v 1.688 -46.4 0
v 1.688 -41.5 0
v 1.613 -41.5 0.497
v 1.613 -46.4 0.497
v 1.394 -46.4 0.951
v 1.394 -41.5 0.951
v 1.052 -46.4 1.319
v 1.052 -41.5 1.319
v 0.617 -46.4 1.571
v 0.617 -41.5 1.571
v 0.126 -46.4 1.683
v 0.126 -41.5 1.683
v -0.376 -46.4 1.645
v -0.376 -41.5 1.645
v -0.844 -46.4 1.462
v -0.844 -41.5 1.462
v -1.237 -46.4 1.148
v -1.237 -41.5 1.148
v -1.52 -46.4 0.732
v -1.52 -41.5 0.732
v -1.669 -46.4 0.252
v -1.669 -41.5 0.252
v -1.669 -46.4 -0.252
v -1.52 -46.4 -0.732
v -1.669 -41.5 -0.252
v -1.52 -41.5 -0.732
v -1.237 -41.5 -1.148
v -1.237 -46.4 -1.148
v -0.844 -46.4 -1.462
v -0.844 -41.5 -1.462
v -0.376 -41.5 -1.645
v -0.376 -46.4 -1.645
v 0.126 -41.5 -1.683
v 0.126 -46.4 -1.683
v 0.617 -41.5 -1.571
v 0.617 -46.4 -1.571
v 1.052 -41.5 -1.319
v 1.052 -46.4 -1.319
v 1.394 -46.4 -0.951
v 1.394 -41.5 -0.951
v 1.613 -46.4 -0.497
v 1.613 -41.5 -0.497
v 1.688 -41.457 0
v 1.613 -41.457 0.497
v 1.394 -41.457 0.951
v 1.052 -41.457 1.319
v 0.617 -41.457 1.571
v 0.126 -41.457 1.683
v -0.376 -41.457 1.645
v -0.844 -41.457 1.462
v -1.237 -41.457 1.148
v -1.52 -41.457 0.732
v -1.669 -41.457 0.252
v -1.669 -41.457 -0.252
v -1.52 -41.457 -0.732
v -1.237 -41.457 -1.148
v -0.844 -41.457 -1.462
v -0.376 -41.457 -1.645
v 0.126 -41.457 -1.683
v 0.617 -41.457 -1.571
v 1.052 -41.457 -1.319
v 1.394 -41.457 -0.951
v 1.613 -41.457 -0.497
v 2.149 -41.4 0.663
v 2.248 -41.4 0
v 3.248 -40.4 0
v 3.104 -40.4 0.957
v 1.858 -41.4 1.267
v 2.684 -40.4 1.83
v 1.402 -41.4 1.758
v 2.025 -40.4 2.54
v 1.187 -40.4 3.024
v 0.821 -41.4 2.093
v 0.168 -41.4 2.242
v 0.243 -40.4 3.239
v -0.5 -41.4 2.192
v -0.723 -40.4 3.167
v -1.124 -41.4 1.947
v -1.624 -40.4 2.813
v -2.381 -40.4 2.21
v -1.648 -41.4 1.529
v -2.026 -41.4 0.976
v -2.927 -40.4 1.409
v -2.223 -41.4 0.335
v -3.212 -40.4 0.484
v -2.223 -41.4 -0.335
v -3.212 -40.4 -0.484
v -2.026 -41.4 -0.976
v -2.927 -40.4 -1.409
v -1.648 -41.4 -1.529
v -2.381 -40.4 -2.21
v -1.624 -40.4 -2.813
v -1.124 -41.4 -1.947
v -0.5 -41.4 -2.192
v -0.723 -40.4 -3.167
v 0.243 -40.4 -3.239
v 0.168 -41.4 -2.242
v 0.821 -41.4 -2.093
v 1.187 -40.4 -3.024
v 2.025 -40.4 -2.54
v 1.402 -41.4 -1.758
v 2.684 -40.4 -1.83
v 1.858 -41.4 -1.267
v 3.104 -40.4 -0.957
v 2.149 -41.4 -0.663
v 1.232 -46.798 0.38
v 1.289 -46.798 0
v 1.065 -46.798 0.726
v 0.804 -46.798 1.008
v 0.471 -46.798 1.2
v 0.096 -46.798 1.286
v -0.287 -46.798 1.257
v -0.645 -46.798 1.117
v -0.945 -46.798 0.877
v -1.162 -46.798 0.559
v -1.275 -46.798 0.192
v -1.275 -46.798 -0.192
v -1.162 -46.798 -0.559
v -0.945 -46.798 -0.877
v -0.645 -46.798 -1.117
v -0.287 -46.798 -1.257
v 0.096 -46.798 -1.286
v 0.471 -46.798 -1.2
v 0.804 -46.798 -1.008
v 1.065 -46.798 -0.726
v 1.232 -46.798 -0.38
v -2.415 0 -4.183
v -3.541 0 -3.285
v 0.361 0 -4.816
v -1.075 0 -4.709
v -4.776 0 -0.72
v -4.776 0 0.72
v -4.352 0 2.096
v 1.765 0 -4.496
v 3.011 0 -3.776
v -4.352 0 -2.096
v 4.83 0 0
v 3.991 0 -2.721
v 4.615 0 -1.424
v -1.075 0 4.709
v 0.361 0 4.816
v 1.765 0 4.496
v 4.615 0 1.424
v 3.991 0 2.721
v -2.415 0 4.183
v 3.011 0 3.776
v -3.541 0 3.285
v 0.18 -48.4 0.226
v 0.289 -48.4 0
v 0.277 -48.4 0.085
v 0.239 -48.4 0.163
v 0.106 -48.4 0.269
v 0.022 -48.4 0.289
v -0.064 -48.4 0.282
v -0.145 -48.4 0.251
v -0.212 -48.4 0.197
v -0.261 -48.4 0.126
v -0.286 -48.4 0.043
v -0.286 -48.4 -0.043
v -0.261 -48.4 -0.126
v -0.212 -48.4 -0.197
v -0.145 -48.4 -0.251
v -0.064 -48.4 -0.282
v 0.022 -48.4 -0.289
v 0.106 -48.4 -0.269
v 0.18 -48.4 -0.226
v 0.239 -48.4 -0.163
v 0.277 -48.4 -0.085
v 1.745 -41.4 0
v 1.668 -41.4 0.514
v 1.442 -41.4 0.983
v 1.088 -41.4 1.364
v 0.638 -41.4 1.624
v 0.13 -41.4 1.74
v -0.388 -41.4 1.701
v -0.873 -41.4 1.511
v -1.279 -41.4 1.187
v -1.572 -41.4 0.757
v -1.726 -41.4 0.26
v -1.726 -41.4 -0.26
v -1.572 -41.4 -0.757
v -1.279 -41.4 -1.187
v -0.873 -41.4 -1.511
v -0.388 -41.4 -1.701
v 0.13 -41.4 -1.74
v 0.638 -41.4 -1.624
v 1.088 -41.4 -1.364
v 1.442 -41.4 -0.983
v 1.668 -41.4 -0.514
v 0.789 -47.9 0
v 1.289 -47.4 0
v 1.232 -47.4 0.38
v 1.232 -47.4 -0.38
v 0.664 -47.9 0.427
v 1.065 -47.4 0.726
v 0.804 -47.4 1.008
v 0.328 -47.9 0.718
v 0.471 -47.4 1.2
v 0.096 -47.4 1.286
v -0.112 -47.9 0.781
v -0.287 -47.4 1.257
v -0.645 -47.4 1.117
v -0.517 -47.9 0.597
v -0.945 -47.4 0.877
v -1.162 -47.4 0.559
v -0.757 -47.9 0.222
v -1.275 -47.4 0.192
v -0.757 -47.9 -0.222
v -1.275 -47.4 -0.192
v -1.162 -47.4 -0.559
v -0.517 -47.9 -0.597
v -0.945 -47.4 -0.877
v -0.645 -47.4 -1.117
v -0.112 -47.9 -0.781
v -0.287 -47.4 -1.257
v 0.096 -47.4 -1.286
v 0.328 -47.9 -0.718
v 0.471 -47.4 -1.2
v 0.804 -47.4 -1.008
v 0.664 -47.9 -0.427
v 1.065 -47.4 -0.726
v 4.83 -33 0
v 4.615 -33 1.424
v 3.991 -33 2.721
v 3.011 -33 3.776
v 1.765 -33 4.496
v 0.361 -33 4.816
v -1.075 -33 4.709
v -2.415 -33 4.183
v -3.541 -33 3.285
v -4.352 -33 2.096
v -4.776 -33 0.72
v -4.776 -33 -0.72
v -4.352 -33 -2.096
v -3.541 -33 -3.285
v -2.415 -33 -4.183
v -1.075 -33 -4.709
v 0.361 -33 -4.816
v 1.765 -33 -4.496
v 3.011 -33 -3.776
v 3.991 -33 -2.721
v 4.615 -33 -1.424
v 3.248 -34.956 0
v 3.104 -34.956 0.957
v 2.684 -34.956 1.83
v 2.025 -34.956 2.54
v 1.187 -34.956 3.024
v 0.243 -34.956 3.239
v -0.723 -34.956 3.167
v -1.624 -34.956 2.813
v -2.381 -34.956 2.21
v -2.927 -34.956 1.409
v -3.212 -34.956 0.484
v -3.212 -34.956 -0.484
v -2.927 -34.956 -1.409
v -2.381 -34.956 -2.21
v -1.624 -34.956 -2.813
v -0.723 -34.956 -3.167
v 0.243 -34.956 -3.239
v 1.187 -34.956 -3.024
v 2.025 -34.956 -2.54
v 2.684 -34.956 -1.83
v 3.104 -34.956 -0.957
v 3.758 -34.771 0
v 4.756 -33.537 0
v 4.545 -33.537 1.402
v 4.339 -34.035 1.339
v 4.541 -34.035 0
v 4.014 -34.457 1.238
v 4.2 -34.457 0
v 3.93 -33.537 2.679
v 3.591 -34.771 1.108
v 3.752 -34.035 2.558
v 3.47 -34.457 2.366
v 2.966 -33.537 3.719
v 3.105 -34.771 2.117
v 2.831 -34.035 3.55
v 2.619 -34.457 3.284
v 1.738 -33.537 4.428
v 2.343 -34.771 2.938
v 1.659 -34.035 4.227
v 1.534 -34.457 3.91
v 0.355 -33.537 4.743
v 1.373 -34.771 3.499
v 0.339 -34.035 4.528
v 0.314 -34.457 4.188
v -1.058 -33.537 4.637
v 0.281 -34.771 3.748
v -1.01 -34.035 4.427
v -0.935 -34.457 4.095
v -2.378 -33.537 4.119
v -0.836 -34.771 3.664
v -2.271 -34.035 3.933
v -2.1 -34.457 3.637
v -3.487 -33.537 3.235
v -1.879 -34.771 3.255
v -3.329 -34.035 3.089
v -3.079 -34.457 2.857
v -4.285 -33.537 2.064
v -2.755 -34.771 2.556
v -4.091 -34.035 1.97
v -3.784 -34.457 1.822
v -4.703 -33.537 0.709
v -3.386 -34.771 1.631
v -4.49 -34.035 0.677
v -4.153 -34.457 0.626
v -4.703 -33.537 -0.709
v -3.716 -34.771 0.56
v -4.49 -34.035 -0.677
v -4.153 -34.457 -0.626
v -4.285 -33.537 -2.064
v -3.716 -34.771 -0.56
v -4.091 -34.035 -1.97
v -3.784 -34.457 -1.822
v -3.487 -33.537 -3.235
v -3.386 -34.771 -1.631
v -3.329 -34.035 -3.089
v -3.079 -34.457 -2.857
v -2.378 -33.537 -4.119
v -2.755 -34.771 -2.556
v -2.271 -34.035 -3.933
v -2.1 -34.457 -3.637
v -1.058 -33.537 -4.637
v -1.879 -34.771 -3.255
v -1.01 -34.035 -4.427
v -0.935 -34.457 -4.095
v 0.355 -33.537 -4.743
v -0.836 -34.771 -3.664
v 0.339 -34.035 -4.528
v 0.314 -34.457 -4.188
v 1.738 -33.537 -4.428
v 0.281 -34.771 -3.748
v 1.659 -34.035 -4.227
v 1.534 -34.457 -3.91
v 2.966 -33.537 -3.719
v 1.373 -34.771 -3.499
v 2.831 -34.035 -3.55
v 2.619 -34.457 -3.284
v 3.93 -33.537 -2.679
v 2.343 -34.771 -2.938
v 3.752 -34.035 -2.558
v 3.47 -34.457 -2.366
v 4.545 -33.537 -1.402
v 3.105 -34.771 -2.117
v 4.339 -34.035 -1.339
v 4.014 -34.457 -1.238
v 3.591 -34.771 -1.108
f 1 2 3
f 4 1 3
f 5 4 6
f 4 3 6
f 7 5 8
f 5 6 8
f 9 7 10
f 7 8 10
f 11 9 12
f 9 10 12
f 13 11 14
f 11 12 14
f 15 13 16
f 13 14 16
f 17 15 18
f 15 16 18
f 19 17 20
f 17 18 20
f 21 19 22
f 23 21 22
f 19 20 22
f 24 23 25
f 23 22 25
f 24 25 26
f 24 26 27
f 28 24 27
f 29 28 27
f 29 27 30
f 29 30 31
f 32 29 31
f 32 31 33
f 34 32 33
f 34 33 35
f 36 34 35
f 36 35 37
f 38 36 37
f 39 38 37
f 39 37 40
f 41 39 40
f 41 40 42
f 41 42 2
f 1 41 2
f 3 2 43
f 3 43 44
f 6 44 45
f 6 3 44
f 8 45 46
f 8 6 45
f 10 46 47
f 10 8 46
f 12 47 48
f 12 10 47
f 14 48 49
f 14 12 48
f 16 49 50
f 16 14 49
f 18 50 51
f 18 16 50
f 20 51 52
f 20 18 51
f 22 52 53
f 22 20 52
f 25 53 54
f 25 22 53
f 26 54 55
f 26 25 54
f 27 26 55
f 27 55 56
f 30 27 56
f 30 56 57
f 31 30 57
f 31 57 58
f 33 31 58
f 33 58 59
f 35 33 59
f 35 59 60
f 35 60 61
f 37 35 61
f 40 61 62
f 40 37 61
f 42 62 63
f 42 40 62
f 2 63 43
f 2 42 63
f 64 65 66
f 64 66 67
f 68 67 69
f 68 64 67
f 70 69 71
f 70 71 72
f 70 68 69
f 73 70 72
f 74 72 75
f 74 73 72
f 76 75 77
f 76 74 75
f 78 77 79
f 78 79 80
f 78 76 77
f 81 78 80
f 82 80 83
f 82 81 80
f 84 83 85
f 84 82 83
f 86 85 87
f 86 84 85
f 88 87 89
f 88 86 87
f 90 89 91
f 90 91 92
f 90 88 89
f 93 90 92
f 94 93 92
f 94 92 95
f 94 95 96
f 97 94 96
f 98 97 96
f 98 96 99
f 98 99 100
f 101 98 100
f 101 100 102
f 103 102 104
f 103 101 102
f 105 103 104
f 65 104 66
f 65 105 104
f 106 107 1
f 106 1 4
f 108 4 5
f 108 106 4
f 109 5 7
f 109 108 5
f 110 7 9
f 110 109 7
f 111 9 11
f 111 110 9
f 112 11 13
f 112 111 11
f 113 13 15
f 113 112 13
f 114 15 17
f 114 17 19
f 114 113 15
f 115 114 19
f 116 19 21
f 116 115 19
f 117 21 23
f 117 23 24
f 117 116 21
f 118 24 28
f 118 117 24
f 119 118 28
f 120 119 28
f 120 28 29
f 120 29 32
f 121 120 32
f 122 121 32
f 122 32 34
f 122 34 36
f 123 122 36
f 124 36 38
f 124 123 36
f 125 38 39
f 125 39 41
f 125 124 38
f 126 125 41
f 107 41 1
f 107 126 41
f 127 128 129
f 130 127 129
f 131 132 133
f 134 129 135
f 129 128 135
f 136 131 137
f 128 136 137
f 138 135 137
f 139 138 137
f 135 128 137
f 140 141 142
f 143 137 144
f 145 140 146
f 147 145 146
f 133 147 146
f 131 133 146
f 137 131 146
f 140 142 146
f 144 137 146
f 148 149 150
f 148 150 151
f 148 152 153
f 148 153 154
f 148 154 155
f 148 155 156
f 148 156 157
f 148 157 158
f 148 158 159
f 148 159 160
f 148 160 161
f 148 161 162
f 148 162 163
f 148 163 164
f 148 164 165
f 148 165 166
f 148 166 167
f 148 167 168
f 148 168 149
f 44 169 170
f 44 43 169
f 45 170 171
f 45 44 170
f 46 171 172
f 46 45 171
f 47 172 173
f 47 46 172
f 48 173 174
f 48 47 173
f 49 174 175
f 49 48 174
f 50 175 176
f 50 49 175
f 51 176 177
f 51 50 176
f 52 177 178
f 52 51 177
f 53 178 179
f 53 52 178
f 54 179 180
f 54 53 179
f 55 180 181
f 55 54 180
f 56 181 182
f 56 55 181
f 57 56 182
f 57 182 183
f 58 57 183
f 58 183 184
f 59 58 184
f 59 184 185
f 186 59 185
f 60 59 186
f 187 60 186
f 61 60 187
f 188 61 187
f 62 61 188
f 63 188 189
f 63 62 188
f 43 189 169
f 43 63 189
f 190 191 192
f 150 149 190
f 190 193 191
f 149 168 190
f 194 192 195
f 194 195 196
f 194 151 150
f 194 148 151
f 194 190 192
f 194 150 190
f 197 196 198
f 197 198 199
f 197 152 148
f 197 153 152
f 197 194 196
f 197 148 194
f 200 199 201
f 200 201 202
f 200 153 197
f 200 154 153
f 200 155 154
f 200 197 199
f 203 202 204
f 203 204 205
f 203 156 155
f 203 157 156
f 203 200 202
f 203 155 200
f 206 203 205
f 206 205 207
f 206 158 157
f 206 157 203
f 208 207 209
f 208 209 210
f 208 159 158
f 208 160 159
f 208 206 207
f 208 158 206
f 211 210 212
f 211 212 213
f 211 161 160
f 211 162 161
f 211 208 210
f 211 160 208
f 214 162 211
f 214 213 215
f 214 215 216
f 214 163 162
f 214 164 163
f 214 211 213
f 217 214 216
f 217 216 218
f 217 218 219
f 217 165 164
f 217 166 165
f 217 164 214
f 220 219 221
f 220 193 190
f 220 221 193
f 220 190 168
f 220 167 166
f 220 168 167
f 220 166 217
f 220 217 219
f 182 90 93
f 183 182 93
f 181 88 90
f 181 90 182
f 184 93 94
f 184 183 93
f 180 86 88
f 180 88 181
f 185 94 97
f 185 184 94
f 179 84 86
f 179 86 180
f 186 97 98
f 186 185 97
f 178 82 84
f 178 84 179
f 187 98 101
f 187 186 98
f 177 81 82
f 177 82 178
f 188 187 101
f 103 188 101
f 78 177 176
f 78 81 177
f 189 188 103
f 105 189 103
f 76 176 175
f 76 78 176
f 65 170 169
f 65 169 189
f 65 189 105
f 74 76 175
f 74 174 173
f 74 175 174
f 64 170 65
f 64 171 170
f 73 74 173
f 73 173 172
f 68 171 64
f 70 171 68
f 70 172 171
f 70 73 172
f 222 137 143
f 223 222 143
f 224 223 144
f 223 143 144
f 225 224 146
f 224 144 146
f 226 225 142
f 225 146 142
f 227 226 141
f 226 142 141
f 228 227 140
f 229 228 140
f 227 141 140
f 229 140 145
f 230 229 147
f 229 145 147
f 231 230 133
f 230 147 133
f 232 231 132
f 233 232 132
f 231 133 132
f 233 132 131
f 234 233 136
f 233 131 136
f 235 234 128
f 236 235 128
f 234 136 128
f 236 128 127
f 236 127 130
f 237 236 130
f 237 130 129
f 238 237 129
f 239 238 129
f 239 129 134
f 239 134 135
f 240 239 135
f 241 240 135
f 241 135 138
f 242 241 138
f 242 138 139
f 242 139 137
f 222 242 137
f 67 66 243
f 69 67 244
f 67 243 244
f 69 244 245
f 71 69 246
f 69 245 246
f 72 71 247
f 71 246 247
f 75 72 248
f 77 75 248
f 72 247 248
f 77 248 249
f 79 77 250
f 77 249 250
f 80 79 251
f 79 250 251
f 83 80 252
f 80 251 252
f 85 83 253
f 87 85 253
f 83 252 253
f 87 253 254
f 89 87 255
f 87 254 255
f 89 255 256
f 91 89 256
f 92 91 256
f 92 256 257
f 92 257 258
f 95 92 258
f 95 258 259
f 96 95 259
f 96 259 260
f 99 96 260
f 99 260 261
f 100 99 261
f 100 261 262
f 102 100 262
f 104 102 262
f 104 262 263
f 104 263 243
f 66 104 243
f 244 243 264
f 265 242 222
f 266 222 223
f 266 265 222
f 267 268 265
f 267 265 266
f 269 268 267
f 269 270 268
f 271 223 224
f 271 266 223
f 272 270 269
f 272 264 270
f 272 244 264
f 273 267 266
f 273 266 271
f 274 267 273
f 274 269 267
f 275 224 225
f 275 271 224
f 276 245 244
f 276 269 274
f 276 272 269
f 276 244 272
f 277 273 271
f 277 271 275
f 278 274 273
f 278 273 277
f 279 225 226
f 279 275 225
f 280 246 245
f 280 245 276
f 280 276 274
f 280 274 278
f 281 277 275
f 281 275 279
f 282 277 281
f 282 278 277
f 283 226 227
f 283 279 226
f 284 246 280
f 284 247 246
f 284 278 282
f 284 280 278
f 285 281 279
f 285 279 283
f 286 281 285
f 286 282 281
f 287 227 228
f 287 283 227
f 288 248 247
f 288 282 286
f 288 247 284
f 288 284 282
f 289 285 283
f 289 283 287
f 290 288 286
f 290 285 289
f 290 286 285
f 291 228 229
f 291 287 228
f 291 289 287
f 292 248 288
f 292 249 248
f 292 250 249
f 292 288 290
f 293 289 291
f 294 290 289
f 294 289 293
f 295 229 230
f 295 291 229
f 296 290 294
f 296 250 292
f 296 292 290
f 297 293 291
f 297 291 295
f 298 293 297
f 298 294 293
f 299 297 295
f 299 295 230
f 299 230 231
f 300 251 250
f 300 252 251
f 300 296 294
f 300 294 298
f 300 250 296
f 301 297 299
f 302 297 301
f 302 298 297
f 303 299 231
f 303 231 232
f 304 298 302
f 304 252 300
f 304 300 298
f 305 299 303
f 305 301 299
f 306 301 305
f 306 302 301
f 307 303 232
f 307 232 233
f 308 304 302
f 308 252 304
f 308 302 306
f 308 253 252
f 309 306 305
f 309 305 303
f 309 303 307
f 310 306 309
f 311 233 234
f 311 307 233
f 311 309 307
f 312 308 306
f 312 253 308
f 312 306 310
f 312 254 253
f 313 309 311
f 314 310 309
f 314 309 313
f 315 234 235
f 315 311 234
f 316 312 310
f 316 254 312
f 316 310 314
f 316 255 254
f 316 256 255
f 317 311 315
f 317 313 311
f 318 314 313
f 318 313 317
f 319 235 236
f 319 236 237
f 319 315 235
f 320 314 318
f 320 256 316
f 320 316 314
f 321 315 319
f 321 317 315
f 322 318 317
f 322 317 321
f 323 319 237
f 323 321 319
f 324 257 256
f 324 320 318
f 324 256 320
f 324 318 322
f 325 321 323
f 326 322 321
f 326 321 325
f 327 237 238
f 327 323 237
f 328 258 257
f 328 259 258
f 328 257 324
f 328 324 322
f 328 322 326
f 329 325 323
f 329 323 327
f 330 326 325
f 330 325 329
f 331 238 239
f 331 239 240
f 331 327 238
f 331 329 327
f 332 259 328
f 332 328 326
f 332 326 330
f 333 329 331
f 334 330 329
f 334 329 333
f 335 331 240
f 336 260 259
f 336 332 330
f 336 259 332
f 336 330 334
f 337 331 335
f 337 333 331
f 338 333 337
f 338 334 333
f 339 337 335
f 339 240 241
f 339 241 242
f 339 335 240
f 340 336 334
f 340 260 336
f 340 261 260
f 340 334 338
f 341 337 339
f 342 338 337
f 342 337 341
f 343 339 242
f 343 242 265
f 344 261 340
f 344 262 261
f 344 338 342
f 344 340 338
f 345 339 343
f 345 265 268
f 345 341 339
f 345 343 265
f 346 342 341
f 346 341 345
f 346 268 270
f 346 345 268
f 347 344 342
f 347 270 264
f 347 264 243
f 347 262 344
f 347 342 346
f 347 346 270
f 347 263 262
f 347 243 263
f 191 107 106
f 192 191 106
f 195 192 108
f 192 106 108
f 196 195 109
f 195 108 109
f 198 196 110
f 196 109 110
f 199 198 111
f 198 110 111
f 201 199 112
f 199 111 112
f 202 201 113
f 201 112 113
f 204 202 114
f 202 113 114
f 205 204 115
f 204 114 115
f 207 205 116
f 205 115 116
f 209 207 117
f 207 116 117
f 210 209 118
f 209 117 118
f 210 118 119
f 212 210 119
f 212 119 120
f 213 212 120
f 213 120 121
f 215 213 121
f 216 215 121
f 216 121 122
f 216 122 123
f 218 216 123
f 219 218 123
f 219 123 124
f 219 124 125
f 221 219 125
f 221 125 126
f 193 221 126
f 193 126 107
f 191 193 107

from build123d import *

# Parameters (mm, degrees)
F0_R         = 4.8298181264
F1_DEPTH     = 25
F2_DEPTH     = 10
F3_R         = 2
F4_R         = 1.5870534729
F5_DEPTH     = 0.5
F6_R         = 2.6450892659
F7_DEPTH     = 41.5
F8_R         = 1.6875975258
F9_DEPTH     = 47.4
F10_S7_R     = 1.6875975258
F10_T8_DEPTH = 5
F11_R        = 3.2484404645
F12_DEPTH    = 41.4
F13_SIZE     = 1
F14_R        = 1.2894560282
F15_DEPTH    = 48.4
F16_SIZE     = 1


# Not quite as in the source:
# - a fillet or chamfer that OpenCascade refuses, or shapes differently, is made with other operations: its cross-section is extruded or revolved along the edge and cut away or added


with BuildPart() as f1:
    # F0 (on Front) → F1 (new body)
    with BuildSketch(Plane.XZ):
        Circle(F0_R)
    extrude(amount=F1_DEPTH)

    # F2 (add): a face of the model
    f2_faces = [f1.faces().sort_by_distance(p)[0] for p in [
        (0, -25, 0),
    ]]
    extrude(f2_faces, amount=F2_DEPTH)

    # F3
    f3_edges = [f1.edges().sort_by_distance(p)[0] for p in [
        (-4.829818, -35, 0),
    ]]
    fillet(f3_edges, radius=F3_R)

    # F4 (on Front) → F5 (cut)
    with BuildSketch(Plane.XZ):
        Circle(F4_R)
    extrude(amount=F5_DEPTH, mode=Mode.SUBTRACT)

    # F6 (on Front) → F7 (join)
    with BuildSketch(Plane.XZ):
        Circle(F6_R)
    extrude(amount=F7_DEPTH)

    # F8 (on Front) → F9 (join)
    with BuildSketch(Plane.XZ):
        Circle(F8_R)
    extrude(amount=F9_DEPTH)

    # F10: chamfer of 1 on 2 edges, made by hand

    # F10_s1 → F10_t2 (revolve, cut)
    with BuildSketch(Plane.XY):
        Polygon((1.6875975258, -46.4), (0.6875975258, -47.4), (1.6875975258, -47.4), align=None)
    revolve(axis=Axis((0, -47.4, 0), (0, -1, 0)), mode=Mode.SUBTRACT)


with BuildPart() as f10_tool4:
    # F10_s5 → F10_t6 (revolve)
    with BuildSketch(Plane.XY):
        Polygon((2.6450892659, -40.5), (1.6450892659, -41.5), (2.6450892659, -41.5), align=None)
    revolve(axis=Axis((0, -41.5, 0), (0, -1, 0)))

    # F10_s7 → F10_t8 (cut, symmetric)
    with BuildSketch(Plane.XZ.offset(41)):
        Circle(F10_S7_R)
    extrude(amount=F10_T8_DEPTH, both=True, mode=Mode.SUBTRACT)


with BuildPart() as f1_1:
    add(f1.part)

    # F10_t3: cut F10_tool4
    add(f10_tool4.part, mode=Mode.SUBTRACT)

    # F11 (on Front) → F12 (join)
    with BuildSketch(Plane.XZ):
        Circle(F11_R)
    extrude(amount=F12_DEPTH)

    # F13
    f13_edges = [f1_1.edges().sort_by_distance(p)[0] for p in [
        (-3.24844, -41.4, 0),
    ]]
    chamfer(f13_edges, length=F13_SIZE)

    # F14 (on Front) → F15 (join)
    with BuildSketch(Plane.XZ):
        Circle(F14_R)
    extrude(amount=F15_DEPTH)

    # F16
    f16_edges = [f1_1.edges().sort_by_distance(p)[0] for p in [
        (-1.289456, -48.4, 0),
    ]]
    chamfer(f16_edges, length=F16_SIZE)


solid = f1_1.part
